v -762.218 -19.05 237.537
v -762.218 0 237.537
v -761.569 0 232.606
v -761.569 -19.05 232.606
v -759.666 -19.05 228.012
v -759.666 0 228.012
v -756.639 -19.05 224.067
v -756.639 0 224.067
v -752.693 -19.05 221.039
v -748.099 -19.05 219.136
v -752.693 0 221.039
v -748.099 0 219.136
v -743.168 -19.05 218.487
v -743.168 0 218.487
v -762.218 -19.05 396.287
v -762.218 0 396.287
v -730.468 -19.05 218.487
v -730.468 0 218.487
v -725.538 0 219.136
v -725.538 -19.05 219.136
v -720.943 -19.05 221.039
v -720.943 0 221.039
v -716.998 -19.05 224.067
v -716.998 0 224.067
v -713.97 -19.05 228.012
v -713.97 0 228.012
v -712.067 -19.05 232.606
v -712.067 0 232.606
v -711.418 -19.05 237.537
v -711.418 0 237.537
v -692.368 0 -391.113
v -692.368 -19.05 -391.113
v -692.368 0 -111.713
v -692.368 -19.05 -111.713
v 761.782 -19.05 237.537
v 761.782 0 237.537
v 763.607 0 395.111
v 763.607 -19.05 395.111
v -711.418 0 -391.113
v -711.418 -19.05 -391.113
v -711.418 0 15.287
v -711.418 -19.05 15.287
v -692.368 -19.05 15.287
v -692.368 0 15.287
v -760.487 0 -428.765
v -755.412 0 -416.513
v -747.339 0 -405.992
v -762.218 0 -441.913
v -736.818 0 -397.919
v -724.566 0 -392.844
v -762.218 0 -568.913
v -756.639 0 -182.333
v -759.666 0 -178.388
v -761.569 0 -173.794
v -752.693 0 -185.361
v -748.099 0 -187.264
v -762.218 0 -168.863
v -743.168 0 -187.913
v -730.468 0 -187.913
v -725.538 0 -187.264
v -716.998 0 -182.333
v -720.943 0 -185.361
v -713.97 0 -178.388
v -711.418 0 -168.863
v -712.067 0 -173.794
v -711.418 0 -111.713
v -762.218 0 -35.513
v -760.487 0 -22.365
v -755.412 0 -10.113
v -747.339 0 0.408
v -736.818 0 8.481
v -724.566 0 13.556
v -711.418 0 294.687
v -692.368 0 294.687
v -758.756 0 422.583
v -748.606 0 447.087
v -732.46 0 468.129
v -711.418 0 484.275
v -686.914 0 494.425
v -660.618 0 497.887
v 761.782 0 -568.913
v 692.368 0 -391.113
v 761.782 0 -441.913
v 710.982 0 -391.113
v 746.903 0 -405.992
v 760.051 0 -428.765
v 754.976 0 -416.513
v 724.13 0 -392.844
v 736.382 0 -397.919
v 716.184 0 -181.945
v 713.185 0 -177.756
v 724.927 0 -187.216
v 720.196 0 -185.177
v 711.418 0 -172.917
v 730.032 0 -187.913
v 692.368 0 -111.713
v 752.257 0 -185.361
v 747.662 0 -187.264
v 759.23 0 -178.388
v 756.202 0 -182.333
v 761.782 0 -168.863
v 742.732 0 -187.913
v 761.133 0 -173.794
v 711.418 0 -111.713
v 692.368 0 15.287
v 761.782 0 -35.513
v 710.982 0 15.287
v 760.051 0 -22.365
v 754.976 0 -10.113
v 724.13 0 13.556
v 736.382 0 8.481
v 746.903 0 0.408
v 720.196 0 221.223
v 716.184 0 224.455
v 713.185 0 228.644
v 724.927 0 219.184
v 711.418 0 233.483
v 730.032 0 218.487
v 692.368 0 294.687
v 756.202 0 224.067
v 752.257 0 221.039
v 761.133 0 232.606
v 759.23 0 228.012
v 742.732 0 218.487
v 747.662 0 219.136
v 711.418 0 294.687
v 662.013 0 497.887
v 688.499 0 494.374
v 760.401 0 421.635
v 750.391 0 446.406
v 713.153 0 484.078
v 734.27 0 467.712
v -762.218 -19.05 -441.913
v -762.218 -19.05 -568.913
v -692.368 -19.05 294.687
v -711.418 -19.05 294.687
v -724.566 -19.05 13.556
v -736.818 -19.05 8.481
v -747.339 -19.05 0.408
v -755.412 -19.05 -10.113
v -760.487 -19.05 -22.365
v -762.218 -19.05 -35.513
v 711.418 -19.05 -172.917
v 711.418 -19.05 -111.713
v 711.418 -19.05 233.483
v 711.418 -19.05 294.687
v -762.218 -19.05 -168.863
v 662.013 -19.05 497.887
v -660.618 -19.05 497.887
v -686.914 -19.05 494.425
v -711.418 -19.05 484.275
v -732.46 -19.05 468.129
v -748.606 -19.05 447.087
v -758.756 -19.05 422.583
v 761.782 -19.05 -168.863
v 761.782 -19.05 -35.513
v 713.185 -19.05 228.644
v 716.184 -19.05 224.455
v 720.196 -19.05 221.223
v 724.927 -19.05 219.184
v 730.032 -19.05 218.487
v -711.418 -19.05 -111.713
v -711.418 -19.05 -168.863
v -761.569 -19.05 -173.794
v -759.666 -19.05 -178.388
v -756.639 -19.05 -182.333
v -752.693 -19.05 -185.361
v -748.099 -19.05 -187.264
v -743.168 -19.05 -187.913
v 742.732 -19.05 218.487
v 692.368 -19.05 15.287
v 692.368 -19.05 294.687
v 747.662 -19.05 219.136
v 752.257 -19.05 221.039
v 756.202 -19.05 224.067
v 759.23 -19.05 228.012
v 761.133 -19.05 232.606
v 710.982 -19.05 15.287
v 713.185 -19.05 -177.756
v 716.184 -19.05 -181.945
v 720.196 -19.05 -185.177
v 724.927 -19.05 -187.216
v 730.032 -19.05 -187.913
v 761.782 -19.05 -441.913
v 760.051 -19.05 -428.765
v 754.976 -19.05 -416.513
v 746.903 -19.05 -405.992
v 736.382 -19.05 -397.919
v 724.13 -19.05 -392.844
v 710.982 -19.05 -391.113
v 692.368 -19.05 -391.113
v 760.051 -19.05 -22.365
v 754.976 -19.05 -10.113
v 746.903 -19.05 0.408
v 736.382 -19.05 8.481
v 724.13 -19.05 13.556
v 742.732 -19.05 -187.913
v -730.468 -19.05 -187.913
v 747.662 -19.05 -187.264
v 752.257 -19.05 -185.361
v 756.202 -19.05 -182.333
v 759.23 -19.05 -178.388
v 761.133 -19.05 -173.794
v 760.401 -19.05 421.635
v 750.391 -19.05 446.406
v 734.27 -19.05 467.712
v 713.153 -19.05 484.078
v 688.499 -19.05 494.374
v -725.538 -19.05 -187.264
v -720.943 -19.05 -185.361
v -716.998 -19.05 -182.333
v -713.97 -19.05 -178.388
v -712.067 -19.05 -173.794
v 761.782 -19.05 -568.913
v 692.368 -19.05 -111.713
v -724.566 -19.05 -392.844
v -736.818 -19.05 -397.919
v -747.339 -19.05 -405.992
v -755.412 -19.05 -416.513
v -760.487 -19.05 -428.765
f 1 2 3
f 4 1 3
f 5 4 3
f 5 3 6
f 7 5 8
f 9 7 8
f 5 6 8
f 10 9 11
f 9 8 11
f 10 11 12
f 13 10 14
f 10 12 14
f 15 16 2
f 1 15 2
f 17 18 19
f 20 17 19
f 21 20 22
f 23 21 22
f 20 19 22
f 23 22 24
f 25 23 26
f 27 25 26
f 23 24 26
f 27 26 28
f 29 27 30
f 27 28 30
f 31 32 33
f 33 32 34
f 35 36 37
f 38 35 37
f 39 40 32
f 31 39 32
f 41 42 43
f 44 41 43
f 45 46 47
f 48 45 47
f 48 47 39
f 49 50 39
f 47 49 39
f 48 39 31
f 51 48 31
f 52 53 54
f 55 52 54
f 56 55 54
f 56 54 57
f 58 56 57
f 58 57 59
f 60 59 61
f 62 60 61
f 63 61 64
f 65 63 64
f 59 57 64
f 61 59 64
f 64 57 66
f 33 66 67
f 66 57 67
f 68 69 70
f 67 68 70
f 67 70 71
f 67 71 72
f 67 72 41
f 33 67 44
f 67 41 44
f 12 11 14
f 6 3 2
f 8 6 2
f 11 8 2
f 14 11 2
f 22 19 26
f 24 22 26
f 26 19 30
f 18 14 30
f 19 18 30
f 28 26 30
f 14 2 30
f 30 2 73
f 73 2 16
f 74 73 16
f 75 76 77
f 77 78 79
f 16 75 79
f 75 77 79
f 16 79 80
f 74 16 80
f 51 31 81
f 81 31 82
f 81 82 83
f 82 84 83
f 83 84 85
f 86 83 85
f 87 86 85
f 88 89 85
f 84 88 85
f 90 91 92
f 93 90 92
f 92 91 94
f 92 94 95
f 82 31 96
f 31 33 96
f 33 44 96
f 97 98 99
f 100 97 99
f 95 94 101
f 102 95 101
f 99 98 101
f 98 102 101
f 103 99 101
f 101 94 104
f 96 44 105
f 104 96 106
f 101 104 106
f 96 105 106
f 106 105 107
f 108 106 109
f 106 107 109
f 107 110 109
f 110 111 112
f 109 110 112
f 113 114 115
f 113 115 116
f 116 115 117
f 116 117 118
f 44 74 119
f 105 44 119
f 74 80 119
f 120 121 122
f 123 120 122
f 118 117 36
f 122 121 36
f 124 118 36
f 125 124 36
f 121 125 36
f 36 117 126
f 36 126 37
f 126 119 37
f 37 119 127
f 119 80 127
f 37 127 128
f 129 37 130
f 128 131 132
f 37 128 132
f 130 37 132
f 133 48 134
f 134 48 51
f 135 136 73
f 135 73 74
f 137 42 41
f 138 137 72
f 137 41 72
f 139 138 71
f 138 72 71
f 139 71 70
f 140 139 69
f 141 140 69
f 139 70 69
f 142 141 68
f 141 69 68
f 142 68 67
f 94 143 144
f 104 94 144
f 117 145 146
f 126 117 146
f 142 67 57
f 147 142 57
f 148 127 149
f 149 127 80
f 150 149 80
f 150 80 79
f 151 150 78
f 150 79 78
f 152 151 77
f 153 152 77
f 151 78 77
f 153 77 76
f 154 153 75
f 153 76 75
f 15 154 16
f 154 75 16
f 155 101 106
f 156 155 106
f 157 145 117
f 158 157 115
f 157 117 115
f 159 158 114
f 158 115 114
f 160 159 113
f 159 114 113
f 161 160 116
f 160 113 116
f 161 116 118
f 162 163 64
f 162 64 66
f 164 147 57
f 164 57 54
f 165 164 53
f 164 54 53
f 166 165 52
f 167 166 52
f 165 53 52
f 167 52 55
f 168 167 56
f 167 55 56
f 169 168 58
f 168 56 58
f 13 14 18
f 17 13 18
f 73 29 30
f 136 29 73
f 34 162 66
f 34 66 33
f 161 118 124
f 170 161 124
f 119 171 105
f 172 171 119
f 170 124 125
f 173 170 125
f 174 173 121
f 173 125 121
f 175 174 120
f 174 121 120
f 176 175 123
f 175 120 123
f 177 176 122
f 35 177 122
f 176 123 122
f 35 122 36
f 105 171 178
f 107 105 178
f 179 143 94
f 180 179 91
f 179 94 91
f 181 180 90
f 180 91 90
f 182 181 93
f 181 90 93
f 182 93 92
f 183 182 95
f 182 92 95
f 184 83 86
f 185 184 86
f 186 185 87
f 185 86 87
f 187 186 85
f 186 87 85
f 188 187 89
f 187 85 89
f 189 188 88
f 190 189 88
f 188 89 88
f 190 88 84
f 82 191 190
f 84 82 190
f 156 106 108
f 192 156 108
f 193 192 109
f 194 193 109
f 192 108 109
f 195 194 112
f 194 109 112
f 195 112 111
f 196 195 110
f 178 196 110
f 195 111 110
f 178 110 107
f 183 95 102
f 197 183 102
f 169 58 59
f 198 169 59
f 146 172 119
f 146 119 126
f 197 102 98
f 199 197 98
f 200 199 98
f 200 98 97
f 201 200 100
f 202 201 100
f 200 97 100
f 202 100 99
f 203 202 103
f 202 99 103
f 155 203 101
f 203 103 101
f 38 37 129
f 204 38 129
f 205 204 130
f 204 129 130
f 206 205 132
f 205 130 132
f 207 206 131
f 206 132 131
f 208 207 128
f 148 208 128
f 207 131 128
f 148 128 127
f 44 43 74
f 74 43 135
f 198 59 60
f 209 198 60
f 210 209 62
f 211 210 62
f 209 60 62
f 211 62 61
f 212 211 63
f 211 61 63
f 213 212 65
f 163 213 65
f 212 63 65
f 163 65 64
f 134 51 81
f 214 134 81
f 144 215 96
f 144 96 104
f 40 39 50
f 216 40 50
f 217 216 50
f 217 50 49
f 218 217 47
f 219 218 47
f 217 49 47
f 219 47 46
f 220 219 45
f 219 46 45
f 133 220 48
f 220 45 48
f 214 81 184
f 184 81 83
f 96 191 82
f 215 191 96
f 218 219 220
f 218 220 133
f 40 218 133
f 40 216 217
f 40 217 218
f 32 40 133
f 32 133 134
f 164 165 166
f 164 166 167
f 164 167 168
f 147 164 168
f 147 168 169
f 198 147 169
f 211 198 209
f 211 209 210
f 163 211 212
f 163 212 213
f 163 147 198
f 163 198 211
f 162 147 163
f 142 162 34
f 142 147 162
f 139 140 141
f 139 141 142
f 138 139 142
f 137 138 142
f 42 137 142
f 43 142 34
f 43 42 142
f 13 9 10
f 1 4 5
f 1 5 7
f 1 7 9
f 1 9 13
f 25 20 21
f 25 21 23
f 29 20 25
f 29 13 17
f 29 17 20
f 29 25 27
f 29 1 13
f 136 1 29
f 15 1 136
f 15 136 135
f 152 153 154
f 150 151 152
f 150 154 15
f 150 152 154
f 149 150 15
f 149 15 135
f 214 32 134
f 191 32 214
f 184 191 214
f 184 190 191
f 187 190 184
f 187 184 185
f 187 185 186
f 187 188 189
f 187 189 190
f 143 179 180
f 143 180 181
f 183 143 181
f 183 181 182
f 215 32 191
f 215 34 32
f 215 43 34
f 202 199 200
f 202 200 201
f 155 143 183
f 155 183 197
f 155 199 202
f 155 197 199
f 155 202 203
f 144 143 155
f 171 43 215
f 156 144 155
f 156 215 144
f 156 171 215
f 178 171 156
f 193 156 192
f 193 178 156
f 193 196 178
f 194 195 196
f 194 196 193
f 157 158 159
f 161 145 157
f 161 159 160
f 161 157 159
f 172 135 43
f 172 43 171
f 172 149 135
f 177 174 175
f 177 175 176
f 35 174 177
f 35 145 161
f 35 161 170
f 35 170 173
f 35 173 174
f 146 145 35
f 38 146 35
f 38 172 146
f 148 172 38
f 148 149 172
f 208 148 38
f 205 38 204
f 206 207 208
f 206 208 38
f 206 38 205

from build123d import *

# Parameters (mm, degrees)
F1_DEPTH = 19.05
F2_W     = 19.05
F2_H     = 279.4
F3_DEPTH = 19.051


with BuildPart() as f1:
    # F0 (on Front) → F1 (new body)
    with BuildSketch(Plane.XZ):
        with BuildLine():
            Line((-743.168125, 218.486937), (-730.468125, 218.486937))
            ThreePointArc((-730.468125, 218.486937), (-716.99774, 224.066552), (-711.418125, 237.536937))
            Line((-711.418125, 237.536937), (-711.418125, 15.286937))
            ThreePointArc((-711.418125, 15.286937), (-747.339149, 0.407961), (-762.218125, -35.513063))
            Line((-762.218125, -35.513063), (-762.218125, -168.863063))
            ThreePointArc((-762.218125, -168.863063), (-756.638509, -182.333448), (-743.168125, -187.913063))
            Line((-743.168125, -187.913063), (-730.468125, -187.913063))
            ThreePointArc((-730.468125, -187.913063), (-716.99774, -182.333448), (-711.418125, -168.863063))
            Line((-711.418125, -168.863063), (-711.418125, -391.113063))
            ThreePointArc((-711.418125, -391.113063), (-747.339149, -405.992039), (-762.218125, -441.913063))
            Line((-762.218125, -441.913063), (-762.218125, -568.913063))
            Line((-762.218125, -568.913063), (-711.418125, -568.913063))
            Line((-711.418125, -568.913063), (-692.368125, -568.913063))
            Line((-692.368125, -568.913063), (691.931875, -568.913063))
            Line((691.931875, -568.913063), (710.981875, -568.913063))
            Line((710.981875, -568.913063), (761.781875, -568.913063))
            Line((761.781875, -568.913063), (761.781875, -441.913063))
            ThreePointArc((761.781875, -441.913063), (746.9029, -405.992039), (710.981875, -391.113063))
            Line((710.981875, -391.113063), (710.981875, -168.863063))
            ThreePointArc((710.981875, -168.863063), (716.561491, -182.333448), (730.031875, -187.913063))
            Line((730.031875, -187.913063), (742.731875, -187.913063))
            ThreePointArc((742.731875, -187.913063), (756.20226, -182.333448), (761.781875, -168.863063))
            Line((761.781875, -168.863063), (761.781875, -35.513063))
            ThreePointArc((761.781875, -35.513063), (746.9029, 0.407961), (710.981875, 15.286937))
            Line((710.981875, 15.286937), (710.981875, 237.536937))
            ThreePointArc((710.981875, 237.536937), (716.561491, 224.066552), (730.031875, 218.486937))
            Line((730.031875, 218.486937), (742.731875, 218.486937))
            ThreePointArc((742.731875, 218.486937), (756.20226, 224.066552), (761.781875, 237.536937))
            Line((761.781875, 237.536937), (763.606541, 395.110511))
            ThreePointArc((763.606541, 395.110511), (734.270133, 467.711845), (662.013352, 497.886937))
            Line((662.013352, 497.886937), (-660.618125, 497.886937))
            ThreePointArc((-660.618125, 497.886937), (-732.460174, 468.128986), (-762.218125, 396.286937))
            Line((-762.218125, 396.286937), (-762.218125, 237.536937))
            ThreePointArc((-762.218125, 237.536937), (-756.638509, 224.066552), (-743.168125, 218.486937))
        make_face()
    extrude(amount=F1_DEPTH)

    # F2 (on face) → F3 (cut, through all)
    with BuildSketch(Plane.XZ.offset(19.05)):
        with Locations((-701.893125, 154.986937)):
            Rectangle(F2_W, F2_H)
        with Locations((-701.893125, -251.413063)):
            Rectangle(F2_W, F2_H)
        with Locations((701.893125, 154.986937)):
            Rectangle(F2_W, F2_H)
        with Locations((701.893125, -251.413063)):
            Rectangle(F2_W, F2_H)
    extrude(amount=-F3_DEPTH, mode=Mode.SUBTRACT)


solid = f1.part
